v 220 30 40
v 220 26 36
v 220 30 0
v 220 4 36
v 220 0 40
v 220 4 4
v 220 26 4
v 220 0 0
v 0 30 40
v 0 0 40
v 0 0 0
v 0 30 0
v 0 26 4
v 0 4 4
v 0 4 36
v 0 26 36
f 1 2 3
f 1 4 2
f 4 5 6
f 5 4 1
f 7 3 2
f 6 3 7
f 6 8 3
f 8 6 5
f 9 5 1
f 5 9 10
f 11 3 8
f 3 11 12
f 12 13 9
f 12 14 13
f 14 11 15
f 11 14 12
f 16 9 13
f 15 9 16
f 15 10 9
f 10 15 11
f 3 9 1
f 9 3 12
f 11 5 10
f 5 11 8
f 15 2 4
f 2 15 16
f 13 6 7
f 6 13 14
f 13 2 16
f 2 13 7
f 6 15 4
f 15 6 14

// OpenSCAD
$fn = 32;

// ----------------------------------------------------------------------
// Box beam: 200-250 mm hollow beam
// ----------------------------------------------------------------------

// --- parameters (mm) ---
beam_l = 220;             // beam length, X
beam_w = 30;              // beam width, Y
beam_h = 40;              // beam height, Z
wall = 4;                 // wall thickness

difference() {
  cube([beam_l, beam_w, beam_h]);
  translate([-1, wall, wall])
    cube([beam_l + 2, beam_w - 2 * wall, beam_h - 2 * wall]);
}
